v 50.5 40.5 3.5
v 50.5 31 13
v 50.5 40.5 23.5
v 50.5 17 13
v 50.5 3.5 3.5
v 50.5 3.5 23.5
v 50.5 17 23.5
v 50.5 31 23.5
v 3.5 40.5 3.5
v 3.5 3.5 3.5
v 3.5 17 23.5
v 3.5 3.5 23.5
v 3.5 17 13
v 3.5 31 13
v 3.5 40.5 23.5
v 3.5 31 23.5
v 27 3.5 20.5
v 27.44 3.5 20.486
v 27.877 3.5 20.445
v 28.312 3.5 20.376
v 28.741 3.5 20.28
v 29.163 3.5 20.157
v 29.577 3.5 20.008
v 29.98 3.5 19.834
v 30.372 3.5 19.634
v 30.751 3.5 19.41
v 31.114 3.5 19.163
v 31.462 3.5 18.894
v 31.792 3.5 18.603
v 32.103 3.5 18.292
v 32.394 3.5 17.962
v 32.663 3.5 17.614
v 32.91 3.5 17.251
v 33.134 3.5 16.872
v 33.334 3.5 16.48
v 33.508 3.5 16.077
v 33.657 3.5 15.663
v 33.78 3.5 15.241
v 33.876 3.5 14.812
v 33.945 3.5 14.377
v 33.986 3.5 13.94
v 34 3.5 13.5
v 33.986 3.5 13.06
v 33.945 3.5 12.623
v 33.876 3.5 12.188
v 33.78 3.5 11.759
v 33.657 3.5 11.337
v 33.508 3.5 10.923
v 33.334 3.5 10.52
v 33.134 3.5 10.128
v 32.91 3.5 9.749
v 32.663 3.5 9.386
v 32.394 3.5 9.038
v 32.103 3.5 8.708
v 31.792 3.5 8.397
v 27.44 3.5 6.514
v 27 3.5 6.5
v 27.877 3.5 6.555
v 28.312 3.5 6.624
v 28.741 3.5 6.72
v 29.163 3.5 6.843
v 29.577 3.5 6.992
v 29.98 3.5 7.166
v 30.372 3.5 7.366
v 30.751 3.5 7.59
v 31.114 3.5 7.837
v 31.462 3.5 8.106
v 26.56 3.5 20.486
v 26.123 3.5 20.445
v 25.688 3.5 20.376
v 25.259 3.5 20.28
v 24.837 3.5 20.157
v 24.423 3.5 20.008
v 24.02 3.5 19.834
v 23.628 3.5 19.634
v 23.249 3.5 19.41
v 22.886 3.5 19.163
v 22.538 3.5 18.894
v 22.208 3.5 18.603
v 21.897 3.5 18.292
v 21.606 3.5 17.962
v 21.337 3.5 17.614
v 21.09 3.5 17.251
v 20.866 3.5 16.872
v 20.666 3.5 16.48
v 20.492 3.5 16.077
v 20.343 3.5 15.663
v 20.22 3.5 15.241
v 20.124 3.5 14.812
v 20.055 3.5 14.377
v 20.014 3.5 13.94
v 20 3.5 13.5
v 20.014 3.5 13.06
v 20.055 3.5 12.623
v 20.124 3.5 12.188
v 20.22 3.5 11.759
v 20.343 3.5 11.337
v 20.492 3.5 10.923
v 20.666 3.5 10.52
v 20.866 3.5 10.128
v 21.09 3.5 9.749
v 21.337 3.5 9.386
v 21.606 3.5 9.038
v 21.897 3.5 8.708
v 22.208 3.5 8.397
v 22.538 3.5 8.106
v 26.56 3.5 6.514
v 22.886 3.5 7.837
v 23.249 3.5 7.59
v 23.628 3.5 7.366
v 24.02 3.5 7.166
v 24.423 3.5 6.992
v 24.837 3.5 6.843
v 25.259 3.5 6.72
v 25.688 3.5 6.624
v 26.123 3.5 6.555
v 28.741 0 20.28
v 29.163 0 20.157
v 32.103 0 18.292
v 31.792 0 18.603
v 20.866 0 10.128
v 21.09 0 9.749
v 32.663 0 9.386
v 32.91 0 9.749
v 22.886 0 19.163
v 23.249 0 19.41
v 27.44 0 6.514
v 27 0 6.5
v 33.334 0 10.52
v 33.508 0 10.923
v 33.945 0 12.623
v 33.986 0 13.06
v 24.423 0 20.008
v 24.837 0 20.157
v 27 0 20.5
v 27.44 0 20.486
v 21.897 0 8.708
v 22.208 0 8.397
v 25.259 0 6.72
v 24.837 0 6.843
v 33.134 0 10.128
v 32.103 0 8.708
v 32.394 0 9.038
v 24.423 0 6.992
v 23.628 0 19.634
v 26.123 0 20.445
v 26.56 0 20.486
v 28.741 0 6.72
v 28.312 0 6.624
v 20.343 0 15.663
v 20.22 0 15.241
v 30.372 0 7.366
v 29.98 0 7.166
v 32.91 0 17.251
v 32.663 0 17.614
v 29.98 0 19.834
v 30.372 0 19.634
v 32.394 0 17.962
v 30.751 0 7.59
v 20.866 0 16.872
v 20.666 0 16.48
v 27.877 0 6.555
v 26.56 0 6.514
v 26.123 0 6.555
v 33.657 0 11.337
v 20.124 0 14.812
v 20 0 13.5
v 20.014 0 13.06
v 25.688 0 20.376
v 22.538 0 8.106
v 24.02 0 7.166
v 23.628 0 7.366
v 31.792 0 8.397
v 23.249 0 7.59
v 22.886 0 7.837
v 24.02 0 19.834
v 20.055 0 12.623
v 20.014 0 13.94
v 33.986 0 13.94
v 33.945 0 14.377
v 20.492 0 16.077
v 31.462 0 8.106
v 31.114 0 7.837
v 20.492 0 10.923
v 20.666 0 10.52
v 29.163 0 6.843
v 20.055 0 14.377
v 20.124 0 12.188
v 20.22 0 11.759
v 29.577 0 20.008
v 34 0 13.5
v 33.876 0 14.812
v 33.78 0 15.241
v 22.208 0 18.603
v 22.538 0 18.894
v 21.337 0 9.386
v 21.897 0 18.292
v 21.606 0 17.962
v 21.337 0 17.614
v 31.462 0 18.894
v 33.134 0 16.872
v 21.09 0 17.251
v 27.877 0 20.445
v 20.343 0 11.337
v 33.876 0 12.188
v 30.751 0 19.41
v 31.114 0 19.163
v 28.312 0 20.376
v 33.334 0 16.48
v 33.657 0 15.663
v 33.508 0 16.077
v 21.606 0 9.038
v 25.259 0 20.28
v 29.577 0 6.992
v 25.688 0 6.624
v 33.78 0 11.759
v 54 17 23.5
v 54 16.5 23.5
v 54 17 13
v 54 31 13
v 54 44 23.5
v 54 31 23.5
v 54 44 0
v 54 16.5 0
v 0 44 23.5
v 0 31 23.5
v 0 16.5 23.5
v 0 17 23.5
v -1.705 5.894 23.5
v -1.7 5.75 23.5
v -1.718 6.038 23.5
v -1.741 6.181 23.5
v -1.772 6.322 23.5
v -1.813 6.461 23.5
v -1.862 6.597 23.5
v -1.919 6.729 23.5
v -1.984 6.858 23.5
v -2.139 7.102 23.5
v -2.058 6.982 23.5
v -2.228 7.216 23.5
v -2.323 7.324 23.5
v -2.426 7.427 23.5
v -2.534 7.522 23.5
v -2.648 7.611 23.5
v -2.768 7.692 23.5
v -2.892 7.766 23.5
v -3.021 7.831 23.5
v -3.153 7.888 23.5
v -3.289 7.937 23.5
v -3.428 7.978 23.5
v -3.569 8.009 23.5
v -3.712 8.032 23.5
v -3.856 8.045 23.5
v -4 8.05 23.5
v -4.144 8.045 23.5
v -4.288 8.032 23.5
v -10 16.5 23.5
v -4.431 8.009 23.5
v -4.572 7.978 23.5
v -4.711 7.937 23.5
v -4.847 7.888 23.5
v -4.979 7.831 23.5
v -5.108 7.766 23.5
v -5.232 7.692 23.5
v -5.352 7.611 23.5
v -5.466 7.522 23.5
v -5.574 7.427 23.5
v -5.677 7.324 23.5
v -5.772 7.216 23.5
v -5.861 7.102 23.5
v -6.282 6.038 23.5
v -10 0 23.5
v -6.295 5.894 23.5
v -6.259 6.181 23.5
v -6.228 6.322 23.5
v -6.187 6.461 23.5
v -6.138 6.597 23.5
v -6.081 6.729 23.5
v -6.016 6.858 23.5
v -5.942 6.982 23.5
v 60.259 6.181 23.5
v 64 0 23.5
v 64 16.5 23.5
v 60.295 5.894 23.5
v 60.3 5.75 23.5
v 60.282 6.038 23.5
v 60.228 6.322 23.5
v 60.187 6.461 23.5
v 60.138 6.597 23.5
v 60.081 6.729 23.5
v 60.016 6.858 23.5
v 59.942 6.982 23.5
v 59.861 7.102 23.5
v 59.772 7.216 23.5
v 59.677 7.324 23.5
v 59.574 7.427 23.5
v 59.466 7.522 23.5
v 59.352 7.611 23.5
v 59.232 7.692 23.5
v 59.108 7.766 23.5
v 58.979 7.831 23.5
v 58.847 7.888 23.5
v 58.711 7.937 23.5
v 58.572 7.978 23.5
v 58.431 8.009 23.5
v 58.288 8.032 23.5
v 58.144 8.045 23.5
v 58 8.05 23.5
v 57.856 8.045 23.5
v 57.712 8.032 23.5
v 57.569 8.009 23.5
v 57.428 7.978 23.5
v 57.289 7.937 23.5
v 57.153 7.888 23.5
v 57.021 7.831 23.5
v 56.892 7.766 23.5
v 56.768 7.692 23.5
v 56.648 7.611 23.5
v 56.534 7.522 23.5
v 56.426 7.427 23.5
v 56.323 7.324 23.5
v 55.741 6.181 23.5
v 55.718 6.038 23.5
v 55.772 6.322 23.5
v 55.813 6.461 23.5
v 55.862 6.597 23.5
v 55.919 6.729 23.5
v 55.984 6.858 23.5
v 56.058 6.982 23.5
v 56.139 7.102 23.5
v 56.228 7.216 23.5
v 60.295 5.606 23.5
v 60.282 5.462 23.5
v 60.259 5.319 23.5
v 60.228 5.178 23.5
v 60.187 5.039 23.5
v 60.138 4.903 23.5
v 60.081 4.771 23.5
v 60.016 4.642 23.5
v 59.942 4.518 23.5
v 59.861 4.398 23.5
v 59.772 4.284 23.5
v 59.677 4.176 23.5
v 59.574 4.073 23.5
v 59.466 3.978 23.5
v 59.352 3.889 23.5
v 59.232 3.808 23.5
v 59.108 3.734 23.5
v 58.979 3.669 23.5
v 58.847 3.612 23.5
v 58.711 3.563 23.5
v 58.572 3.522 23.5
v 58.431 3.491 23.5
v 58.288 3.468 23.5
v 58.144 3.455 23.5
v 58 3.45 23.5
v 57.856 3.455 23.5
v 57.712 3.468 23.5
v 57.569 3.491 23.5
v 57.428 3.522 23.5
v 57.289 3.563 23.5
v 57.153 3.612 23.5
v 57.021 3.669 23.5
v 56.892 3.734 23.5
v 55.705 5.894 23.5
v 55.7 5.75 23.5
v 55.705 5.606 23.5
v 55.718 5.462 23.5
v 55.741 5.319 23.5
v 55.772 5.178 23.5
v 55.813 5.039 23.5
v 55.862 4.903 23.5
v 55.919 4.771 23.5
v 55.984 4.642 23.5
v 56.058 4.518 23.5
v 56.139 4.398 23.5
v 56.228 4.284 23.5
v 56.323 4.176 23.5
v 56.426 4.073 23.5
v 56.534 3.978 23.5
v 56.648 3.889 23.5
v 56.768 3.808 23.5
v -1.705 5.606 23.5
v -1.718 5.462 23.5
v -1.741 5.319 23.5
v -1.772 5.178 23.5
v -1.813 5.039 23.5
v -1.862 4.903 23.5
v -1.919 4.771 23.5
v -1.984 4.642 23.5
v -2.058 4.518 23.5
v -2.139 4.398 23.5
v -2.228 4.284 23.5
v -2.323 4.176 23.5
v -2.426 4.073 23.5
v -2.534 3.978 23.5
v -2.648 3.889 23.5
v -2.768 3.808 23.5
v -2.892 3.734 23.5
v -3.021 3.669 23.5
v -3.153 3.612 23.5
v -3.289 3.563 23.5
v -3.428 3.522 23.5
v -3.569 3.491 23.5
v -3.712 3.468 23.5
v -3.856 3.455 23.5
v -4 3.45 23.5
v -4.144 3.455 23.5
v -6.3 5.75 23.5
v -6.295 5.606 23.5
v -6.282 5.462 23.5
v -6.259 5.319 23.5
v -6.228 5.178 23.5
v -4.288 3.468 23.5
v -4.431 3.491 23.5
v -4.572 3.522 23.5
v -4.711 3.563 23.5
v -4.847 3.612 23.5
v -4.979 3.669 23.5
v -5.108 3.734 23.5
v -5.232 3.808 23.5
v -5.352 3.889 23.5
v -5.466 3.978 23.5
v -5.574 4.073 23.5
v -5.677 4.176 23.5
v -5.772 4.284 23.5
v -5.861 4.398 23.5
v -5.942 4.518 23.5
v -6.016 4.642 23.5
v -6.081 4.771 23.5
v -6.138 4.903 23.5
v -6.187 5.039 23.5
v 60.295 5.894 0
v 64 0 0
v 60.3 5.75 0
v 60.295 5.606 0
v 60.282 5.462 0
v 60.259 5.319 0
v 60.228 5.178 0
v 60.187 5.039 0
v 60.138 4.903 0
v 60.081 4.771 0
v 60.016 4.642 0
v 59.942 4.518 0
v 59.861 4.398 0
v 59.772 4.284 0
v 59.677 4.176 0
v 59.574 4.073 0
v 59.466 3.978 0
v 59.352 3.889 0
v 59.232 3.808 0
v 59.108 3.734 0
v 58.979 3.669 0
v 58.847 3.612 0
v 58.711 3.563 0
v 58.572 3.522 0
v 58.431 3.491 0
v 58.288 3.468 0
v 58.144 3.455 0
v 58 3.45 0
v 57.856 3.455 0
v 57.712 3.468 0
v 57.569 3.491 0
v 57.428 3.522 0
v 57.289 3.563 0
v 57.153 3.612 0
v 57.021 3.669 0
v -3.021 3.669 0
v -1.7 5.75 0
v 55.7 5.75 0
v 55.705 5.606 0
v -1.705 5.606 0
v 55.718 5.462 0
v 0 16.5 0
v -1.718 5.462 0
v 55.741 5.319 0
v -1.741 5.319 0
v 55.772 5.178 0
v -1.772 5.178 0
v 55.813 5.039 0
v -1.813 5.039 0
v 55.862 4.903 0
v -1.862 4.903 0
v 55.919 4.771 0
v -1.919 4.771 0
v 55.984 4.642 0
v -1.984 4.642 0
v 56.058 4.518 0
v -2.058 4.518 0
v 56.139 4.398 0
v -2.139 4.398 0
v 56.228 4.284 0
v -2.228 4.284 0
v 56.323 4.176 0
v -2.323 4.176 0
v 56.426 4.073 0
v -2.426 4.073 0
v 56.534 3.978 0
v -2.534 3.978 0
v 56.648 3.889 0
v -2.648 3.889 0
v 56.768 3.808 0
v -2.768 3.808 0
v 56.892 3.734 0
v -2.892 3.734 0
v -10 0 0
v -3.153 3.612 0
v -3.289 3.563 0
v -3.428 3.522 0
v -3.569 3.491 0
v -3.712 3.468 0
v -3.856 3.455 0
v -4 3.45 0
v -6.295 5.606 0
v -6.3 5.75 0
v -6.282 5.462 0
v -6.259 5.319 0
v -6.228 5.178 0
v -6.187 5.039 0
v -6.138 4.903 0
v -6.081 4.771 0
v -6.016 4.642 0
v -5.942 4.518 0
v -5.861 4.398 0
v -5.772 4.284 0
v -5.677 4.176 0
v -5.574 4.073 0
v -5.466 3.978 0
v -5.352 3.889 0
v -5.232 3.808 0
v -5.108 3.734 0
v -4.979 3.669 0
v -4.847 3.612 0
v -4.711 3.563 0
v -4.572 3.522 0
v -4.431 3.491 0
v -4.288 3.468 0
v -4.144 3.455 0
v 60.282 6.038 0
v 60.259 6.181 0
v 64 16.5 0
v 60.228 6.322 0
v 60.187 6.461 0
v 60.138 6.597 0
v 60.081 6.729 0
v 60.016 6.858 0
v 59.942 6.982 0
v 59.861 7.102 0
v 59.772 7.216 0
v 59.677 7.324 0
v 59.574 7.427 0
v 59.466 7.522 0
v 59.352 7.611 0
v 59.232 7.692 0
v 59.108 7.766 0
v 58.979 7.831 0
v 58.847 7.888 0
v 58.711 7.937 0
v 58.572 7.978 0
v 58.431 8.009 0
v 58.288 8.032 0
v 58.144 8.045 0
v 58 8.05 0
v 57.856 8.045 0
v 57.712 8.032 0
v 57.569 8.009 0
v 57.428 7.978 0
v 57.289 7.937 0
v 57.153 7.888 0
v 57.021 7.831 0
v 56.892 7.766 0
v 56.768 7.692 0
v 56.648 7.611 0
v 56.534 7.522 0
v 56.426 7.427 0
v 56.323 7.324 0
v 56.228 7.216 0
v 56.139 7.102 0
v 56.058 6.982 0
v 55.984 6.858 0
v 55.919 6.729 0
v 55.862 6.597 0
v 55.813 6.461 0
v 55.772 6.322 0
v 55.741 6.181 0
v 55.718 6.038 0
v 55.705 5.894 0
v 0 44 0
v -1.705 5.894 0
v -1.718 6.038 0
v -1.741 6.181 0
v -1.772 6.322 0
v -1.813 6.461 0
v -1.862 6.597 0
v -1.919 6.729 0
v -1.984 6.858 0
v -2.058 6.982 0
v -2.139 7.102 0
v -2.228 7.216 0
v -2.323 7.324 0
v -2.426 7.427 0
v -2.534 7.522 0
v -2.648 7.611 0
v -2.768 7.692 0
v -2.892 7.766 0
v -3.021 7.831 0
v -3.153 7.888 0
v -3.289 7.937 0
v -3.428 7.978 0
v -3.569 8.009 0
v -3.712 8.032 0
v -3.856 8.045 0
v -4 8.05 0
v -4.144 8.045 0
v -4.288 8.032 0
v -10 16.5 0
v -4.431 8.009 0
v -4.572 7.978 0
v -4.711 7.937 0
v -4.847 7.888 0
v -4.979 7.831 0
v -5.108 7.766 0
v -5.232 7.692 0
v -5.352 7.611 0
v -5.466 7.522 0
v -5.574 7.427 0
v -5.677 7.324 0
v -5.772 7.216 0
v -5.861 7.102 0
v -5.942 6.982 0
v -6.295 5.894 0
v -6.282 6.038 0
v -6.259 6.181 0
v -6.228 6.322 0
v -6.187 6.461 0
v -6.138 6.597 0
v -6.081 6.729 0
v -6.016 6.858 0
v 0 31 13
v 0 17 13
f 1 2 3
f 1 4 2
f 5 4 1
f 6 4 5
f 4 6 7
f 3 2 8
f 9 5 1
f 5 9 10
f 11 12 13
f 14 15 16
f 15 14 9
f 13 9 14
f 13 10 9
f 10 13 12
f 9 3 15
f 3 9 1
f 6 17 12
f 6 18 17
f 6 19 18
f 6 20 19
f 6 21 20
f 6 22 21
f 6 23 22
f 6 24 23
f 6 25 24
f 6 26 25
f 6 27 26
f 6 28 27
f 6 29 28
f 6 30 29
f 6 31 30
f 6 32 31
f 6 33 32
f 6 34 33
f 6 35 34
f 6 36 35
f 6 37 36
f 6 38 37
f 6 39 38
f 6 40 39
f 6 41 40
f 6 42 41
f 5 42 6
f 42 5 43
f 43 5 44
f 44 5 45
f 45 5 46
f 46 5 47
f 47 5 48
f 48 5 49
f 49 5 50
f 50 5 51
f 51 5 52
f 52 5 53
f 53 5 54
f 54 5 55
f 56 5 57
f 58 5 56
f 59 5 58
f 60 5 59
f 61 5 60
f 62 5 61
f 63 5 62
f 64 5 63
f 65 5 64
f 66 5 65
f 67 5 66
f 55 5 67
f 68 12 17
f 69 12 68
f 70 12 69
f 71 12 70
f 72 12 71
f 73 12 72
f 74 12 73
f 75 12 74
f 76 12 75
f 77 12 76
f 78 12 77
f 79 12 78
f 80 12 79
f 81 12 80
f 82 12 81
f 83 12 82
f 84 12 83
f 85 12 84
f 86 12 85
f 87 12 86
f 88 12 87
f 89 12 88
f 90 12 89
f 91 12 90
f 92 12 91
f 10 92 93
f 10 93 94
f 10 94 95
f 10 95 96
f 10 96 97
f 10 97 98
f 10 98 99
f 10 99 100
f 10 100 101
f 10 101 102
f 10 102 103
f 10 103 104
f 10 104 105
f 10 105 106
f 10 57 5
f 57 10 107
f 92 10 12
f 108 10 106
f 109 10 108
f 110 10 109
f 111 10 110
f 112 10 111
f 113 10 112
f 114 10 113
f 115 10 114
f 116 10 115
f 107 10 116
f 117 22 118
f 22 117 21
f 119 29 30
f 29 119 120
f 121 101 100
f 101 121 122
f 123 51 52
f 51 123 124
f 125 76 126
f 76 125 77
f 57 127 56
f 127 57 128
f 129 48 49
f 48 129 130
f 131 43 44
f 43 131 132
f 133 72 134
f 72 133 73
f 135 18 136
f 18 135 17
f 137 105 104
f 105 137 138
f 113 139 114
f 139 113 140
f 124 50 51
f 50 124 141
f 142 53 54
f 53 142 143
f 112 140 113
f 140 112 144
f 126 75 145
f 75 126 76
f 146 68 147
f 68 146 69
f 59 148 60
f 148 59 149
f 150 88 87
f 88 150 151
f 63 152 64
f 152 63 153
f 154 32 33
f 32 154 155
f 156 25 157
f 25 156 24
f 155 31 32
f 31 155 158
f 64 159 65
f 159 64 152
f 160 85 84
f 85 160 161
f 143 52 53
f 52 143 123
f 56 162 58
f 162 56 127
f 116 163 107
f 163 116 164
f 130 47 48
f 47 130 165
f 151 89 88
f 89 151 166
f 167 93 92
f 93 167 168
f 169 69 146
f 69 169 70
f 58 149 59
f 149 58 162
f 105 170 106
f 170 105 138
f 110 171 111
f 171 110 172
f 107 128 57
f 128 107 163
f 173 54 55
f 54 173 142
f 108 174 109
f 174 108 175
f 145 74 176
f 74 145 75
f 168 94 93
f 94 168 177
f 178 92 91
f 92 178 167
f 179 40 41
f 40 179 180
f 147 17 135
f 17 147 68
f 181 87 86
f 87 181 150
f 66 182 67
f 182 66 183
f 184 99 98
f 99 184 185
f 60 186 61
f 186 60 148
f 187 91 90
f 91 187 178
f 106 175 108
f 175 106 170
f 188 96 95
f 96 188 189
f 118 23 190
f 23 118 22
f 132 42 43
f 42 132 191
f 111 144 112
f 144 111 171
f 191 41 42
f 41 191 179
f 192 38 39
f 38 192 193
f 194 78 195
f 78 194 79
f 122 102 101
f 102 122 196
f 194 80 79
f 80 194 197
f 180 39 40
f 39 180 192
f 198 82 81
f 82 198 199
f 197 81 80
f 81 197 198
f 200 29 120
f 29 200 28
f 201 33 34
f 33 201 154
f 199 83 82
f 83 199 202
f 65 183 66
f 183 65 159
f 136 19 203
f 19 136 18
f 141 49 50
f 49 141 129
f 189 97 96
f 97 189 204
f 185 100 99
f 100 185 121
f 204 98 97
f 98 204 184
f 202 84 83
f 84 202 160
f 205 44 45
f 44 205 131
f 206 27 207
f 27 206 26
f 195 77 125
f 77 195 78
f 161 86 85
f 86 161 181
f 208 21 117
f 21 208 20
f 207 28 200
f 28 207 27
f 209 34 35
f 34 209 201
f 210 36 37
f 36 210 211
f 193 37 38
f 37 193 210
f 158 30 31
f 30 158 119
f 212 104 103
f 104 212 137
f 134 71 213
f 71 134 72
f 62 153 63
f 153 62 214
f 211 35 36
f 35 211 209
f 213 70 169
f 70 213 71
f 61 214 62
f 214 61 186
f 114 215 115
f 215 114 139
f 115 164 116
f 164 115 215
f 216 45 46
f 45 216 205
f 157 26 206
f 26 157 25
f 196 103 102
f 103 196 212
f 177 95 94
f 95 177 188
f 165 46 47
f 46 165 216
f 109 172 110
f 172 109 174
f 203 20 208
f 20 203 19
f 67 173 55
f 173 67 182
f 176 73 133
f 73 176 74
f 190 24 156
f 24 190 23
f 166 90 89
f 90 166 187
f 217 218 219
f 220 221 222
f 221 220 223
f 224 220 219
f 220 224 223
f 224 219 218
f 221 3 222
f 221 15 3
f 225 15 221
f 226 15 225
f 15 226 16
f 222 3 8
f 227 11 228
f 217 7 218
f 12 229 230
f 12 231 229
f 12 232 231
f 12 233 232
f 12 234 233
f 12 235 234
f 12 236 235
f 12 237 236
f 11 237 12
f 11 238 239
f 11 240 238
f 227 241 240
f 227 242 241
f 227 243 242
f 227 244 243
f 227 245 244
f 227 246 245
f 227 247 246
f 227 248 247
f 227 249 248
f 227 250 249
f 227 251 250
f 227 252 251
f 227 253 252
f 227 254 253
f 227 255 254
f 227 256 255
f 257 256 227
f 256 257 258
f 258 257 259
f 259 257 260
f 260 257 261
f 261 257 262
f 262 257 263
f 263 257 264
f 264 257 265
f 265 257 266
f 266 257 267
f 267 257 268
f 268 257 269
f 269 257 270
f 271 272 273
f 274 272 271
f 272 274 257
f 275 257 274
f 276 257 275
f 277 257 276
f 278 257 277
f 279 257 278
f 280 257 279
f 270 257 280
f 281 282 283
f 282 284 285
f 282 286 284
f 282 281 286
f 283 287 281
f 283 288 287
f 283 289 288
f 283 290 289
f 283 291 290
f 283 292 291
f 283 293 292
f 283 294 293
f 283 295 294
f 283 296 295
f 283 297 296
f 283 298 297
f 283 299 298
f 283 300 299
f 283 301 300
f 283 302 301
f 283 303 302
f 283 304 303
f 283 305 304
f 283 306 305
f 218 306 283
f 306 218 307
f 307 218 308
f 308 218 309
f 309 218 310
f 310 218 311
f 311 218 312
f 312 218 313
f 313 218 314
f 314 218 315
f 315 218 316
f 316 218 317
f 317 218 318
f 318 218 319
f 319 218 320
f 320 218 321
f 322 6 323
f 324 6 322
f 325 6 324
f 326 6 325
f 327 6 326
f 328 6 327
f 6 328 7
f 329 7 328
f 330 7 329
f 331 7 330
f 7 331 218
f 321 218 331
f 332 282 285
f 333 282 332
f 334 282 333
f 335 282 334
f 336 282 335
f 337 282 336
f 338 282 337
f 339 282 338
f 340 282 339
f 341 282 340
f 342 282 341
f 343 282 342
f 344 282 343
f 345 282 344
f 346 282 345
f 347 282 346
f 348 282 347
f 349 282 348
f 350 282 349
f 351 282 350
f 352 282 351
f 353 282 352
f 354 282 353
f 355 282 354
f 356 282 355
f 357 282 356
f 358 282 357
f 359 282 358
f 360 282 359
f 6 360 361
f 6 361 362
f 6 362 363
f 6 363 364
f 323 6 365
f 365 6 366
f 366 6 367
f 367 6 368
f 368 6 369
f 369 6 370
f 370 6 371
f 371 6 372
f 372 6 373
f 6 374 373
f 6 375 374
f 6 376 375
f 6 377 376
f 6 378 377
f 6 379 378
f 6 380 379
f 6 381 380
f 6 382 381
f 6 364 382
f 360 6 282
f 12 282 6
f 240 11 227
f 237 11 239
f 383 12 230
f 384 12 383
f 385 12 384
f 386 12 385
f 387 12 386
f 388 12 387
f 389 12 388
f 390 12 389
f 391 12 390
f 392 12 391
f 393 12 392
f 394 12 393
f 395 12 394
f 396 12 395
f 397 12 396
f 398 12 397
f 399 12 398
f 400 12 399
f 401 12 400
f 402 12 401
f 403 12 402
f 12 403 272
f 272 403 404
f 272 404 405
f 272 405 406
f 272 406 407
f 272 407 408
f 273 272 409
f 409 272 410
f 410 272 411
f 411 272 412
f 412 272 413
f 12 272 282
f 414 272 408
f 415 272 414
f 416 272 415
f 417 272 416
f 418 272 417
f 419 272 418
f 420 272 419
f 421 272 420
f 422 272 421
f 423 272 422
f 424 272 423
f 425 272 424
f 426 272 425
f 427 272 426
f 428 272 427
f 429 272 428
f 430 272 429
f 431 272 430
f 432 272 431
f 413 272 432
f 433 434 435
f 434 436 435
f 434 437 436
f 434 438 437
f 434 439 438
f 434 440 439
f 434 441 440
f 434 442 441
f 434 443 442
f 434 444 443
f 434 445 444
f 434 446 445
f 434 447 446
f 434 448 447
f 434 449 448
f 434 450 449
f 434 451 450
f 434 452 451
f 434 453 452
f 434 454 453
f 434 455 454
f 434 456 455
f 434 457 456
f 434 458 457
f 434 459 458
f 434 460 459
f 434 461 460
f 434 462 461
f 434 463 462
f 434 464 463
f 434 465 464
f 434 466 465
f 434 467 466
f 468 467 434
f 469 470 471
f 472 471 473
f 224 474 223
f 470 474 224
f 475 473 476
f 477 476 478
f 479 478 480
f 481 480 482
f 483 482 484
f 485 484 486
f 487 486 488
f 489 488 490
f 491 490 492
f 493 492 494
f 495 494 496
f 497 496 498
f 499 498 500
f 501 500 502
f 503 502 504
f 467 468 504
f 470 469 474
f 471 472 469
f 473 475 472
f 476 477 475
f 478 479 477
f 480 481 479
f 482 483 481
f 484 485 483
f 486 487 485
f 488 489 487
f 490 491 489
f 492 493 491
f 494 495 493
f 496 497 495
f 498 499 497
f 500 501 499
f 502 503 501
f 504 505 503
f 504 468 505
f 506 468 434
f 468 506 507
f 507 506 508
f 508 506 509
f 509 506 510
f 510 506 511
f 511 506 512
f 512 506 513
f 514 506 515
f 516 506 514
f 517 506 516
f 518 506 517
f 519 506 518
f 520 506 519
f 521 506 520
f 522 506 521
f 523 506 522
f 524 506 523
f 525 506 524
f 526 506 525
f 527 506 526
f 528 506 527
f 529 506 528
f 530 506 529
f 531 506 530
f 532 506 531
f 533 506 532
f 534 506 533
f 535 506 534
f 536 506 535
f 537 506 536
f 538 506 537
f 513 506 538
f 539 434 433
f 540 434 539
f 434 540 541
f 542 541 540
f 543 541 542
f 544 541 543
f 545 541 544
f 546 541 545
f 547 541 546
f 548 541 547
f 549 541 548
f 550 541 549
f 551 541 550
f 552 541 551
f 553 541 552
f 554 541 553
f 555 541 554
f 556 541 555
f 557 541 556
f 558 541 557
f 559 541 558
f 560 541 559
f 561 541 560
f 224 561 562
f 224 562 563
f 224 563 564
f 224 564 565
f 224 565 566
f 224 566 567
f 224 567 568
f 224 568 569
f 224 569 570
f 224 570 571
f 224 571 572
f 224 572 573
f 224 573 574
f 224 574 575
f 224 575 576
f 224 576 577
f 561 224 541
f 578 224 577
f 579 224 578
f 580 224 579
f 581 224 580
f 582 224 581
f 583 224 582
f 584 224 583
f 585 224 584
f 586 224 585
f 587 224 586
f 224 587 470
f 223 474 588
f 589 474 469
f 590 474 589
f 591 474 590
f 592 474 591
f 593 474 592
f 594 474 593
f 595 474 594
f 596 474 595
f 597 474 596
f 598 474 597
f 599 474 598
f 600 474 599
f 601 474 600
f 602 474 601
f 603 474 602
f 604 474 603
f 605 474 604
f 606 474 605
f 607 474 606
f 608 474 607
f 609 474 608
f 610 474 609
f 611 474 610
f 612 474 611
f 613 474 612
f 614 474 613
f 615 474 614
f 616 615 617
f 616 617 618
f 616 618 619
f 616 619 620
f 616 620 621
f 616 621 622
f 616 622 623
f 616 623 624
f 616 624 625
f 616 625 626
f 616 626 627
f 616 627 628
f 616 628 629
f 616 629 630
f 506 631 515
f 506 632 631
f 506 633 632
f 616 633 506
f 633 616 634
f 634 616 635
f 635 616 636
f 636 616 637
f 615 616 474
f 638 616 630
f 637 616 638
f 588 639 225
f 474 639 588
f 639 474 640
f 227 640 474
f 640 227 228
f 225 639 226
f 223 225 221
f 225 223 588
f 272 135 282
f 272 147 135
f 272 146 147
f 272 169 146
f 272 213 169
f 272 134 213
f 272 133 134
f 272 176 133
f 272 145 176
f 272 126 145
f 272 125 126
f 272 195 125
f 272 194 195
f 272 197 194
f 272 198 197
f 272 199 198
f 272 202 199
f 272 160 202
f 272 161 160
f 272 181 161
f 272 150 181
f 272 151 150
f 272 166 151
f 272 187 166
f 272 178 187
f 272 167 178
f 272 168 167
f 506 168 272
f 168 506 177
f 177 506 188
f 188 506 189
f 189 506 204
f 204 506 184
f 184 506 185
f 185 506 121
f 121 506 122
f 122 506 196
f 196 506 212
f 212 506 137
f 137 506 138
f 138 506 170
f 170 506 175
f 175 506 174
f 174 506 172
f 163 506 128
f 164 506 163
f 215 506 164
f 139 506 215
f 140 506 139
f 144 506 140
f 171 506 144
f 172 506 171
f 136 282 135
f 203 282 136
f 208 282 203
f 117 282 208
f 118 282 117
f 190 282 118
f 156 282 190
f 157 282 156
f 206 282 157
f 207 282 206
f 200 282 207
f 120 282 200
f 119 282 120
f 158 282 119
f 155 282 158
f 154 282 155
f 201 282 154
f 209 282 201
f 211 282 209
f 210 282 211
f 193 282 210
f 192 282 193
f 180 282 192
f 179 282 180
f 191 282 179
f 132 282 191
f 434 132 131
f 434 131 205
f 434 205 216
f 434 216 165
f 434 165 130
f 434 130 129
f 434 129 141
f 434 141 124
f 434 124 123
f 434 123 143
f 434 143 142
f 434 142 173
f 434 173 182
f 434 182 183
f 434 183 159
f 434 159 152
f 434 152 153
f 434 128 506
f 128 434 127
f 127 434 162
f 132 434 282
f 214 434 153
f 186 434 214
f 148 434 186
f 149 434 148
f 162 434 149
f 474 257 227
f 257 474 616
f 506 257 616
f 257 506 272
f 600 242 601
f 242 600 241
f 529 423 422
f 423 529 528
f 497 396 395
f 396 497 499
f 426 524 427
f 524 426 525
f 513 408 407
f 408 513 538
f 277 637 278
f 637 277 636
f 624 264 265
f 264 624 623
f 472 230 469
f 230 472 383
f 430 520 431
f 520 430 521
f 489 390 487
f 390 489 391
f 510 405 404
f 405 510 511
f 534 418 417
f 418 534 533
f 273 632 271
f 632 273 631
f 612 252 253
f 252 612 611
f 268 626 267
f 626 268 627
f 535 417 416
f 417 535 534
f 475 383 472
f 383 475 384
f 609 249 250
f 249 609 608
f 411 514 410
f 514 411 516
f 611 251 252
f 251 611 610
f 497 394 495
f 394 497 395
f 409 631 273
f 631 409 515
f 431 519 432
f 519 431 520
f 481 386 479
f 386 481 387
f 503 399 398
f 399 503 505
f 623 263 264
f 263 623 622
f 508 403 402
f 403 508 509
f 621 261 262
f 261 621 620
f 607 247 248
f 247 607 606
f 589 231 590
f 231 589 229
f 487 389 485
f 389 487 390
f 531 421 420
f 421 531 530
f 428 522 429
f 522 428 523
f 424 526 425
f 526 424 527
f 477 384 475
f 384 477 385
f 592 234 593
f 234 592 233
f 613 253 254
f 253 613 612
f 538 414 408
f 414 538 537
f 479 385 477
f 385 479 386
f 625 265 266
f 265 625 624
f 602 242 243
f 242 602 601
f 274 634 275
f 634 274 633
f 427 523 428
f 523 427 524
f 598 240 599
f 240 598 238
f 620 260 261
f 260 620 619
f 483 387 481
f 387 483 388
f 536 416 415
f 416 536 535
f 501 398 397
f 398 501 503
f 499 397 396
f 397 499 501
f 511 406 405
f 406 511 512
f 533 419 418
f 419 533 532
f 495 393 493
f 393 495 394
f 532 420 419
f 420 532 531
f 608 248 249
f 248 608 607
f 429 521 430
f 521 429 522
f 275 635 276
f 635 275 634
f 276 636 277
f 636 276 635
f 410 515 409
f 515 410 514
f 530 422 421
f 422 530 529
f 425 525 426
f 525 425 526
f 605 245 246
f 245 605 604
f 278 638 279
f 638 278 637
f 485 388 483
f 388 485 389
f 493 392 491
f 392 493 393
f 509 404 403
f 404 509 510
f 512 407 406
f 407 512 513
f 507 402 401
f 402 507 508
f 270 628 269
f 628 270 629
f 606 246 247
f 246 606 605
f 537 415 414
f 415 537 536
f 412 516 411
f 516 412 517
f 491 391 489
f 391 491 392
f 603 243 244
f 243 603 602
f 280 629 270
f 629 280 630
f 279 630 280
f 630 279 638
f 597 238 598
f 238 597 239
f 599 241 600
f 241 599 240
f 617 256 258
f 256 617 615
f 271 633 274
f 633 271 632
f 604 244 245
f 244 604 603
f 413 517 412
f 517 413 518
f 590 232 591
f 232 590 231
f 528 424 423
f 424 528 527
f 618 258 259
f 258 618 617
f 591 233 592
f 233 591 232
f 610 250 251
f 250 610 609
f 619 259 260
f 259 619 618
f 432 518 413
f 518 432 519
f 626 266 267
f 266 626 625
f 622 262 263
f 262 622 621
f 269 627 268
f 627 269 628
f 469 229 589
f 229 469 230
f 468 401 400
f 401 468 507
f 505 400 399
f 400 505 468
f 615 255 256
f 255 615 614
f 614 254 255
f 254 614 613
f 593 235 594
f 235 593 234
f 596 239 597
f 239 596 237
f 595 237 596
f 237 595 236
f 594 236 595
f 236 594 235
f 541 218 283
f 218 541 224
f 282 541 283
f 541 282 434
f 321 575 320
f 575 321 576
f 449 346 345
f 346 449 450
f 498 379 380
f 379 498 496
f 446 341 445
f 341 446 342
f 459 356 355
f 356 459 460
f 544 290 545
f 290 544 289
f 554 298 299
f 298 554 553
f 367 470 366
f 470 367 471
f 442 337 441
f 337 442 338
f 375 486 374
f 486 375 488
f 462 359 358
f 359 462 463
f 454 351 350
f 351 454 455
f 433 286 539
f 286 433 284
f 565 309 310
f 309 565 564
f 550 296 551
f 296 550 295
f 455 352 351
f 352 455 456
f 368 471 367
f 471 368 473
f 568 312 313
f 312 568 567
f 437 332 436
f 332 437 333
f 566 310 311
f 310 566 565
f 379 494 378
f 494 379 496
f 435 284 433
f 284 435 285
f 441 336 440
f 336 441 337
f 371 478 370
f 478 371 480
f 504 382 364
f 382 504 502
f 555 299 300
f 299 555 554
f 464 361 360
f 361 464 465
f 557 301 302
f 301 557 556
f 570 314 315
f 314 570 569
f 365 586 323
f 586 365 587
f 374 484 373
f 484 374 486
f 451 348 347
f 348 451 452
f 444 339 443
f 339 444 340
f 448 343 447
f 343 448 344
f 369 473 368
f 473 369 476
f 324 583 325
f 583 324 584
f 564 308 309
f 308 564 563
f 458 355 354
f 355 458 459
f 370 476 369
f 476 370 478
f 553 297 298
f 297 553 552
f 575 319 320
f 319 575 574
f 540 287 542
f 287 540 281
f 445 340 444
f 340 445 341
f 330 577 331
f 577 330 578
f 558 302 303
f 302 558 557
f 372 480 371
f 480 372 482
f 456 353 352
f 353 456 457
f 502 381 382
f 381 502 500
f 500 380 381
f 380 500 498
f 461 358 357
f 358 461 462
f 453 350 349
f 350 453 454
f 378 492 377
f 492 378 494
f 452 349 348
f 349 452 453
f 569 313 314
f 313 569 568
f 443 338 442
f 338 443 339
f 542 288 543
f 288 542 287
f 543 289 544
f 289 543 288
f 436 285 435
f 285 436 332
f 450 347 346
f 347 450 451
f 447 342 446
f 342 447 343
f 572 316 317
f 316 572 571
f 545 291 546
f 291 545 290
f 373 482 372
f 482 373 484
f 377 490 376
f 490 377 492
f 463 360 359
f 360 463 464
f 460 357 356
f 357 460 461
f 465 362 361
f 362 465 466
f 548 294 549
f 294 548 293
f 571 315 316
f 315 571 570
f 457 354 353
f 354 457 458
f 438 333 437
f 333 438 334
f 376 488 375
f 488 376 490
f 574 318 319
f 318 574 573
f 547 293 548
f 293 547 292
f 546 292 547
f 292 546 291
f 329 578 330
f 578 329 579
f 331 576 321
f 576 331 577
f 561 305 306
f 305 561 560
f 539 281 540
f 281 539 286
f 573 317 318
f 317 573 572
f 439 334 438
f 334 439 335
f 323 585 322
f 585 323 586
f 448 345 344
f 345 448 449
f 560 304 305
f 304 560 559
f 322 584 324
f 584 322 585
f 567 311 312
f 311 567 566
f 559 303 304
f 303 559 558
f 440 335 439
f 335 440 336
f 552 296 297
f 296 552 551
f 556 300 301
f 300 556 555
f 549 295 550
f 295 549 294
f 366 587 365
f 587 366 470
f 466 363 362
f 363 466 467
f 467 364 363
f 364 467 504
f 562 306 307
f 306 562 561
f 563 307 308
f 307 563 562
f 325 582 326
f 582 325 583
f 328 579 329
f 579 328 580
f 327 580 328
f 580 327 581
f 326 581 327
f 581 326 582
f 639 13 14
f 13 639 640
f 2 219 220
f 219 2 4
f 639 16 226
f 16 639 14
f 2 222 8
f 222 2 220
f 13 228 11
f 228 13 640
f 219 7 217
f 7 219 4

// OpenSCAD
length = 37;//52;
width = 47;//86;
height = 20;
wall = 3.5;
o_width = width + wall + wall;
o_length = length + wall + wall;
o_height = height + wall;

resolution = 100;

$fn = resolution;

// outer box
standoff_id=3.45;
standoff_od=14;
standoff_od_wall_depth = wall-2;
standoff_width = 55.8;
standoff_length = 28.4;
difference(){
union(){
difference(){
    // main box
    cube([o_width, o_length, o_height]);
    translate([wall, wall, 0]) {
        translate([0, 0, wall]) {
            // 9999 to take out the whole face
            cube([width, length, 9999]);
        }
        //all the standoff holes
        //center of the box
        // shift it up a bit
        translate([width/2, length/2, wall+height/2]) {
            // standoff holes
            rotate([90,90,0]){
                cylinder(h=9999, d=standoff_od);
        }
        }
    }
}


mount_arm_surface_area = 20;
screwhole_size = 4.6;

//box_mount_hole_1
translate([0,0,0]) {
mirror([0,1,-1]) {
rotate(90){
    difference() {
            difference() {
                cube([mount_arm_surface_area+wall, 10, o_height-wall-wall]);
                // angled for strength
                translate([mount_arm_surface_area+wall, mount_arm_surface_area, -1]){
                    //cylinder(h=9999, r=mount_arm_surface_area);
                }
            }
        // screw hole
        rotate([0,90,0]) {
            translate([-o_height/2+6, 4, -1]){
                cylinder(h=9999, d=screwhole_size);
            }
        }
    }
}
//box mount hole 2
//copied and pasted but translated an mirrored
translate([o_width, 0, 0]){
    mirror([1,0,0]){
        rotate(90) {
            difference() {
                    difference() {
                        cube([mount_arm_surface_area+wall, 10, o_height-wall-wall]);
                        // angled for strength
                        translate([mount_arm_surface_area+wall, mount_arm_surface_area, -1]){
                            //cylinder(h=9999, r=mount_arm_surface_area);
                        }
                    }
                // screw hole
                rotate([0,90,0]) {
                    translate([-o_height/2+6, 4, -1]){
                        cylinder(h=9999, d=screwhole_size);
                    }
                }
            }
        }
    }
}
}
}
}
translate([-100, length-wall-wall-wall-wall-wall-wall+1, height-wall-wall]) {
            cube([width*20, 14, 30]);
    }
    translate([0, wall, 0]) {

     //cube([100, 100, 100]);
    }

}
